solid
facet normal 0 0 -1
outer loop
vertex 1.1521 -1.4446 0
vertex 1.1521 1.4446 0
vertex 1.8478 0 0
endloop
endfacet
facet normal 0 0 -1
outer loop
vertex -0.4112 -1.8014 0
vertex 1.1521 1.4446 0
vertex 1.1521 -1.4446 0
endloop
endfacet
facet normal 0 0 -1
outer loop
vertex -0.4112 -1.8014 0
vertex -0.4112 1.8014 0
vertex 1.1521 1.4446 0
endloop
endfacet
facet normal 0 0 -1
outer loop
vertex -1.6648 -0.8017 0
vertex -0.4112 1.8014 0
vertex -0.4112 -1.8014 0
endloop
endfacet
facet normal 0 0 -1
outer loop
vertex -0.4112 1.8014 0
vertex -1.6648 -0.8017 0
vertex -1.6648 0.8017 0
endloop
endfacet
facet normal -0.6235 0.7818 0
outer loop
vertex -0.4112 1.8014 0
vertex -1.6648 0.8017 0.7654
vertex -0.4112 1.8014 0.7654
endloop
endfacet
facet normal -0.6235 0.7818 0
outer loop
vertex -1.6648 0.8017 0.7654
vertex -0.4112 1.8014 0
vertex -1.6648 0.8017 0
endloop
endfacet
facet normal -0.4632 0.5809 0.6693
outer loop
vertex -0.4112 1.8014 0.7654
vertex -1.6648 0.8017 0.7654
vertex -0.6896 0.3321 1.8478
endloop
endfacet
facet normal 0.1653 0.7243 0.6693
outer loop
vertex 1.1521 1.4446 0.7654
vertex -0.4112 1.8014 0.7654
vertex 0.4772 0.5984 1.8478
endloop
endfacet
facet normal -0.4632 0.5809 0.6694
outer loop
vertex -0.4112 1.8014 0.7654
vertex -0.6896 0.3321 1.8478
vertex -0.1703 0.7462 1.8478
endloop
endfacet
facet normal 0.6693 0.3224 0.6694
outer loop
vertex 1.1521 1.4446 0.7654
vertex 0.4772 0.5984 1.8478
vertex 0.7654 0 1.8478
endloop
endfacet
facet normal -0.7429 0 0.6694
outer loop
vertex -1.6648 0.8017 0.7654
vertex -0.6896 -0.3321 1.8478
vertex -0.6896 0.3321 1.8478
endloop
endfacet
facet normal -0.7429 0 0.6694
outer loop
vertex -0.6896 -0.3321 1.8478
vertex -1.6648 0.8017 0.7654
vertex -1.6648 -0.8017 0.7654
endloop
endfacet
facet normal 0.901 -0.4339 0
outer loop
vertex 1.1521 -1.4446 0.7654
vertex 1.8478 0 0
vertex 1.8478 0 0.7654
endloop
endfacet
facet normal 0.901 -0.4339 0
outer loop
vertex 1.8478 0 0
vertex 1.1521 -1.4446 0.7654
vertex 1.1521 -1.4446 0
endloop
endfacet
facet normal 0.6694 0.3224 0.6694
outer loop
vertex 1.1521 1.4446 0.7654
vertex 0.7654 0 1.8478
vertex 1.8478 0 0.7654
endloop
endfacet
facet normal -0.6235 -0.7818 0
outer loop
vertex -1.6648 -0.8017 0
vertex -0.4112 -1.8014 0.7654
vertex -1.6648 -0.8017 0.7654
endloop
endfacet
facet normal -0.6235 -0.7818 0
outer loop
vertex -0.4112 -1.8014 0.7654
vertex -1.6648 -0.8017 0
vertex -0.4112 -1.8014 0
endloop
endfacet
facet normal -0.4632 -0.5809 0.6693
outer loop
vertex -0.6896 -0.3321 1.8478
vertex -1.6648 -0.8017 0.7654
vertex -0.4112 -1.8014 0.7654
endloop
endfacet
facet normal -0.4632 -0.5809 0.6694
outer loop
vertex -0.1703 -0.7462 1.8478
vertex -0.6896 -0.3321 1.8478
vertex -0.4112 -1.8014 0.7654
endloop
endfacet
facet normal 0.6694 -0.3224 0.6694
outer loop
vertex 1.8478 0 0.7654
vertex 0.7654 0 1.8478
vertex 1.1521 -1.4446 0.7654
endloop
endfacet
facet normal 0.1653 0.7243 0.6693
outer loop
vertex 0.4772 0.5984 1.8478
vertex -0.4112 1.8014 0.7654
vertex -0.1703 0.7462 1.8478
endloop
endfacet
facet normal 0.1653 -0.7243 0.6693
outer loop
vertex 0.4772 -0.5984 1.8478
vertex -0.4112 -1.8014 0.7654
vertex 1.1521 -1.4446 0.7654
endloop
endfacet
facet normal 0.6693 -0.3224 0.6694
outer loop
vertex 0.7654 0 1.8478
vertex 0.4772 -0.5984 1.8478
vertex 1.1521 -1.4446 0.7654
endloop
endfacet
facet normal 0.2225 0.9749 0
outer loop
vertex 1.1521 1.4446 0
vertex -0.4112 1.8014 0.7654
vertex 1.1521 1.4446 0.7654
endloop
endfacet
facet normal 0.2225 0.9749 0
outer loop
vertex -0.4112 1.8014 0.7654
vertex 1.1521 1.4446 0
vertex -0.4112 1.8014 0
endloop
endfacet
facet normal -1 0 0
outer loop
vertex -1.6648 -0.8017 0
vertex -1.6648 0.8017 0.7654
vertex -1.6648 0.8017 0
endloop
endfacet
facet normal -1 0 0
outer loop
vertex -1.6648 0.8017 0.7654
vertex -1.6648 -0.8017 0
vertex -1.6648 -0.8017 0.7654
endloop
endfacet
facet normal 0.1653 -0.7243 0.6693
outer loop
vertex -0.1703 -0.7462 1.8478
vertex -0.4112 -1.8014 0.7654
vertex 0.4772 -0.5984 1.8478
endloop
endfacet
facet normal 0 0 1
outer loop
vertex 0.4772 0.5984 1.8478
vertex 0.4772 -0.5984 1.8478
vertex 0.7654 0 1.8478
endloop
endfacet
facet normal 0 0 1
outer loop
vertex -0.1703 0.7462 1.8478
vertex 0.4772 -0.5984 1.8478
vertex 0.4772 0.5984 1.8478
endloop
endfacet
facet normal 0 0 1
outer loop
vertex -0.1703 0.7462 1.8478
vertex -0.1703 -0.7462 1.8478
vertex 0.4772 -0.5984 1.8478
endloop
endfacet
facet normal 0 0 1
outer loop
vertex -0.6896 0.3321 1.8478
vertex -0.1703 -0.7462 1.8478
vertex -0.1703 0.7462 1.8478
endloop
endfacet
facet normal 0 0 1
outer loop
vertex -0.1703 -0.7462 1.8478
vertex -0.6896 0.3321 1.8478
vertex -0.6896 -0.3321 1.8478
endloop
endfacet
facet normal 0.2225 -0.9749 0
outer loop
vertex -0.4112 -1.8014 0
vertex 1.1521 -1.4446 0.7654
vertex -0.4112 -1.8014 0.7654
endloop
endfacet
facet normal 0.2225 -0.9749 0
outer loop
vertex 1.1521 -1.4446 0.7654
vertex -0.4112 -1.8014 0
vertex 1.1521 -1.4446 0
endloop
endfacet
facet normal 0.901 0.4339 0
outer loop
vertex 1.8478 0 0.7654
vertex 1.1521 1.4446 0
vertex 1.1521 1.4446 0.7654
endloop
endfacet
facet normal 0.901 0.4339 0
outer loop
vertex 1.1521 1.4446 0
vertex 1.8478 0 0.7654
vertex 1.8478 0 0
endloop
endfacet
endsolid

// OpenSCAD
// Generated by generate_scads.py
intersection() {
  intersection() {
    cylinder(h=25, r=6, center=false);
    cylinder(h=5, r=12, center=false);
    cylinder(h=20, r=12, center=true);
    sphere(r=2);
  }
  intersection() {
    sphere(r=12);
  }
  sphere(r=12);
  cube(size=[20,30,30], center=true);
}
